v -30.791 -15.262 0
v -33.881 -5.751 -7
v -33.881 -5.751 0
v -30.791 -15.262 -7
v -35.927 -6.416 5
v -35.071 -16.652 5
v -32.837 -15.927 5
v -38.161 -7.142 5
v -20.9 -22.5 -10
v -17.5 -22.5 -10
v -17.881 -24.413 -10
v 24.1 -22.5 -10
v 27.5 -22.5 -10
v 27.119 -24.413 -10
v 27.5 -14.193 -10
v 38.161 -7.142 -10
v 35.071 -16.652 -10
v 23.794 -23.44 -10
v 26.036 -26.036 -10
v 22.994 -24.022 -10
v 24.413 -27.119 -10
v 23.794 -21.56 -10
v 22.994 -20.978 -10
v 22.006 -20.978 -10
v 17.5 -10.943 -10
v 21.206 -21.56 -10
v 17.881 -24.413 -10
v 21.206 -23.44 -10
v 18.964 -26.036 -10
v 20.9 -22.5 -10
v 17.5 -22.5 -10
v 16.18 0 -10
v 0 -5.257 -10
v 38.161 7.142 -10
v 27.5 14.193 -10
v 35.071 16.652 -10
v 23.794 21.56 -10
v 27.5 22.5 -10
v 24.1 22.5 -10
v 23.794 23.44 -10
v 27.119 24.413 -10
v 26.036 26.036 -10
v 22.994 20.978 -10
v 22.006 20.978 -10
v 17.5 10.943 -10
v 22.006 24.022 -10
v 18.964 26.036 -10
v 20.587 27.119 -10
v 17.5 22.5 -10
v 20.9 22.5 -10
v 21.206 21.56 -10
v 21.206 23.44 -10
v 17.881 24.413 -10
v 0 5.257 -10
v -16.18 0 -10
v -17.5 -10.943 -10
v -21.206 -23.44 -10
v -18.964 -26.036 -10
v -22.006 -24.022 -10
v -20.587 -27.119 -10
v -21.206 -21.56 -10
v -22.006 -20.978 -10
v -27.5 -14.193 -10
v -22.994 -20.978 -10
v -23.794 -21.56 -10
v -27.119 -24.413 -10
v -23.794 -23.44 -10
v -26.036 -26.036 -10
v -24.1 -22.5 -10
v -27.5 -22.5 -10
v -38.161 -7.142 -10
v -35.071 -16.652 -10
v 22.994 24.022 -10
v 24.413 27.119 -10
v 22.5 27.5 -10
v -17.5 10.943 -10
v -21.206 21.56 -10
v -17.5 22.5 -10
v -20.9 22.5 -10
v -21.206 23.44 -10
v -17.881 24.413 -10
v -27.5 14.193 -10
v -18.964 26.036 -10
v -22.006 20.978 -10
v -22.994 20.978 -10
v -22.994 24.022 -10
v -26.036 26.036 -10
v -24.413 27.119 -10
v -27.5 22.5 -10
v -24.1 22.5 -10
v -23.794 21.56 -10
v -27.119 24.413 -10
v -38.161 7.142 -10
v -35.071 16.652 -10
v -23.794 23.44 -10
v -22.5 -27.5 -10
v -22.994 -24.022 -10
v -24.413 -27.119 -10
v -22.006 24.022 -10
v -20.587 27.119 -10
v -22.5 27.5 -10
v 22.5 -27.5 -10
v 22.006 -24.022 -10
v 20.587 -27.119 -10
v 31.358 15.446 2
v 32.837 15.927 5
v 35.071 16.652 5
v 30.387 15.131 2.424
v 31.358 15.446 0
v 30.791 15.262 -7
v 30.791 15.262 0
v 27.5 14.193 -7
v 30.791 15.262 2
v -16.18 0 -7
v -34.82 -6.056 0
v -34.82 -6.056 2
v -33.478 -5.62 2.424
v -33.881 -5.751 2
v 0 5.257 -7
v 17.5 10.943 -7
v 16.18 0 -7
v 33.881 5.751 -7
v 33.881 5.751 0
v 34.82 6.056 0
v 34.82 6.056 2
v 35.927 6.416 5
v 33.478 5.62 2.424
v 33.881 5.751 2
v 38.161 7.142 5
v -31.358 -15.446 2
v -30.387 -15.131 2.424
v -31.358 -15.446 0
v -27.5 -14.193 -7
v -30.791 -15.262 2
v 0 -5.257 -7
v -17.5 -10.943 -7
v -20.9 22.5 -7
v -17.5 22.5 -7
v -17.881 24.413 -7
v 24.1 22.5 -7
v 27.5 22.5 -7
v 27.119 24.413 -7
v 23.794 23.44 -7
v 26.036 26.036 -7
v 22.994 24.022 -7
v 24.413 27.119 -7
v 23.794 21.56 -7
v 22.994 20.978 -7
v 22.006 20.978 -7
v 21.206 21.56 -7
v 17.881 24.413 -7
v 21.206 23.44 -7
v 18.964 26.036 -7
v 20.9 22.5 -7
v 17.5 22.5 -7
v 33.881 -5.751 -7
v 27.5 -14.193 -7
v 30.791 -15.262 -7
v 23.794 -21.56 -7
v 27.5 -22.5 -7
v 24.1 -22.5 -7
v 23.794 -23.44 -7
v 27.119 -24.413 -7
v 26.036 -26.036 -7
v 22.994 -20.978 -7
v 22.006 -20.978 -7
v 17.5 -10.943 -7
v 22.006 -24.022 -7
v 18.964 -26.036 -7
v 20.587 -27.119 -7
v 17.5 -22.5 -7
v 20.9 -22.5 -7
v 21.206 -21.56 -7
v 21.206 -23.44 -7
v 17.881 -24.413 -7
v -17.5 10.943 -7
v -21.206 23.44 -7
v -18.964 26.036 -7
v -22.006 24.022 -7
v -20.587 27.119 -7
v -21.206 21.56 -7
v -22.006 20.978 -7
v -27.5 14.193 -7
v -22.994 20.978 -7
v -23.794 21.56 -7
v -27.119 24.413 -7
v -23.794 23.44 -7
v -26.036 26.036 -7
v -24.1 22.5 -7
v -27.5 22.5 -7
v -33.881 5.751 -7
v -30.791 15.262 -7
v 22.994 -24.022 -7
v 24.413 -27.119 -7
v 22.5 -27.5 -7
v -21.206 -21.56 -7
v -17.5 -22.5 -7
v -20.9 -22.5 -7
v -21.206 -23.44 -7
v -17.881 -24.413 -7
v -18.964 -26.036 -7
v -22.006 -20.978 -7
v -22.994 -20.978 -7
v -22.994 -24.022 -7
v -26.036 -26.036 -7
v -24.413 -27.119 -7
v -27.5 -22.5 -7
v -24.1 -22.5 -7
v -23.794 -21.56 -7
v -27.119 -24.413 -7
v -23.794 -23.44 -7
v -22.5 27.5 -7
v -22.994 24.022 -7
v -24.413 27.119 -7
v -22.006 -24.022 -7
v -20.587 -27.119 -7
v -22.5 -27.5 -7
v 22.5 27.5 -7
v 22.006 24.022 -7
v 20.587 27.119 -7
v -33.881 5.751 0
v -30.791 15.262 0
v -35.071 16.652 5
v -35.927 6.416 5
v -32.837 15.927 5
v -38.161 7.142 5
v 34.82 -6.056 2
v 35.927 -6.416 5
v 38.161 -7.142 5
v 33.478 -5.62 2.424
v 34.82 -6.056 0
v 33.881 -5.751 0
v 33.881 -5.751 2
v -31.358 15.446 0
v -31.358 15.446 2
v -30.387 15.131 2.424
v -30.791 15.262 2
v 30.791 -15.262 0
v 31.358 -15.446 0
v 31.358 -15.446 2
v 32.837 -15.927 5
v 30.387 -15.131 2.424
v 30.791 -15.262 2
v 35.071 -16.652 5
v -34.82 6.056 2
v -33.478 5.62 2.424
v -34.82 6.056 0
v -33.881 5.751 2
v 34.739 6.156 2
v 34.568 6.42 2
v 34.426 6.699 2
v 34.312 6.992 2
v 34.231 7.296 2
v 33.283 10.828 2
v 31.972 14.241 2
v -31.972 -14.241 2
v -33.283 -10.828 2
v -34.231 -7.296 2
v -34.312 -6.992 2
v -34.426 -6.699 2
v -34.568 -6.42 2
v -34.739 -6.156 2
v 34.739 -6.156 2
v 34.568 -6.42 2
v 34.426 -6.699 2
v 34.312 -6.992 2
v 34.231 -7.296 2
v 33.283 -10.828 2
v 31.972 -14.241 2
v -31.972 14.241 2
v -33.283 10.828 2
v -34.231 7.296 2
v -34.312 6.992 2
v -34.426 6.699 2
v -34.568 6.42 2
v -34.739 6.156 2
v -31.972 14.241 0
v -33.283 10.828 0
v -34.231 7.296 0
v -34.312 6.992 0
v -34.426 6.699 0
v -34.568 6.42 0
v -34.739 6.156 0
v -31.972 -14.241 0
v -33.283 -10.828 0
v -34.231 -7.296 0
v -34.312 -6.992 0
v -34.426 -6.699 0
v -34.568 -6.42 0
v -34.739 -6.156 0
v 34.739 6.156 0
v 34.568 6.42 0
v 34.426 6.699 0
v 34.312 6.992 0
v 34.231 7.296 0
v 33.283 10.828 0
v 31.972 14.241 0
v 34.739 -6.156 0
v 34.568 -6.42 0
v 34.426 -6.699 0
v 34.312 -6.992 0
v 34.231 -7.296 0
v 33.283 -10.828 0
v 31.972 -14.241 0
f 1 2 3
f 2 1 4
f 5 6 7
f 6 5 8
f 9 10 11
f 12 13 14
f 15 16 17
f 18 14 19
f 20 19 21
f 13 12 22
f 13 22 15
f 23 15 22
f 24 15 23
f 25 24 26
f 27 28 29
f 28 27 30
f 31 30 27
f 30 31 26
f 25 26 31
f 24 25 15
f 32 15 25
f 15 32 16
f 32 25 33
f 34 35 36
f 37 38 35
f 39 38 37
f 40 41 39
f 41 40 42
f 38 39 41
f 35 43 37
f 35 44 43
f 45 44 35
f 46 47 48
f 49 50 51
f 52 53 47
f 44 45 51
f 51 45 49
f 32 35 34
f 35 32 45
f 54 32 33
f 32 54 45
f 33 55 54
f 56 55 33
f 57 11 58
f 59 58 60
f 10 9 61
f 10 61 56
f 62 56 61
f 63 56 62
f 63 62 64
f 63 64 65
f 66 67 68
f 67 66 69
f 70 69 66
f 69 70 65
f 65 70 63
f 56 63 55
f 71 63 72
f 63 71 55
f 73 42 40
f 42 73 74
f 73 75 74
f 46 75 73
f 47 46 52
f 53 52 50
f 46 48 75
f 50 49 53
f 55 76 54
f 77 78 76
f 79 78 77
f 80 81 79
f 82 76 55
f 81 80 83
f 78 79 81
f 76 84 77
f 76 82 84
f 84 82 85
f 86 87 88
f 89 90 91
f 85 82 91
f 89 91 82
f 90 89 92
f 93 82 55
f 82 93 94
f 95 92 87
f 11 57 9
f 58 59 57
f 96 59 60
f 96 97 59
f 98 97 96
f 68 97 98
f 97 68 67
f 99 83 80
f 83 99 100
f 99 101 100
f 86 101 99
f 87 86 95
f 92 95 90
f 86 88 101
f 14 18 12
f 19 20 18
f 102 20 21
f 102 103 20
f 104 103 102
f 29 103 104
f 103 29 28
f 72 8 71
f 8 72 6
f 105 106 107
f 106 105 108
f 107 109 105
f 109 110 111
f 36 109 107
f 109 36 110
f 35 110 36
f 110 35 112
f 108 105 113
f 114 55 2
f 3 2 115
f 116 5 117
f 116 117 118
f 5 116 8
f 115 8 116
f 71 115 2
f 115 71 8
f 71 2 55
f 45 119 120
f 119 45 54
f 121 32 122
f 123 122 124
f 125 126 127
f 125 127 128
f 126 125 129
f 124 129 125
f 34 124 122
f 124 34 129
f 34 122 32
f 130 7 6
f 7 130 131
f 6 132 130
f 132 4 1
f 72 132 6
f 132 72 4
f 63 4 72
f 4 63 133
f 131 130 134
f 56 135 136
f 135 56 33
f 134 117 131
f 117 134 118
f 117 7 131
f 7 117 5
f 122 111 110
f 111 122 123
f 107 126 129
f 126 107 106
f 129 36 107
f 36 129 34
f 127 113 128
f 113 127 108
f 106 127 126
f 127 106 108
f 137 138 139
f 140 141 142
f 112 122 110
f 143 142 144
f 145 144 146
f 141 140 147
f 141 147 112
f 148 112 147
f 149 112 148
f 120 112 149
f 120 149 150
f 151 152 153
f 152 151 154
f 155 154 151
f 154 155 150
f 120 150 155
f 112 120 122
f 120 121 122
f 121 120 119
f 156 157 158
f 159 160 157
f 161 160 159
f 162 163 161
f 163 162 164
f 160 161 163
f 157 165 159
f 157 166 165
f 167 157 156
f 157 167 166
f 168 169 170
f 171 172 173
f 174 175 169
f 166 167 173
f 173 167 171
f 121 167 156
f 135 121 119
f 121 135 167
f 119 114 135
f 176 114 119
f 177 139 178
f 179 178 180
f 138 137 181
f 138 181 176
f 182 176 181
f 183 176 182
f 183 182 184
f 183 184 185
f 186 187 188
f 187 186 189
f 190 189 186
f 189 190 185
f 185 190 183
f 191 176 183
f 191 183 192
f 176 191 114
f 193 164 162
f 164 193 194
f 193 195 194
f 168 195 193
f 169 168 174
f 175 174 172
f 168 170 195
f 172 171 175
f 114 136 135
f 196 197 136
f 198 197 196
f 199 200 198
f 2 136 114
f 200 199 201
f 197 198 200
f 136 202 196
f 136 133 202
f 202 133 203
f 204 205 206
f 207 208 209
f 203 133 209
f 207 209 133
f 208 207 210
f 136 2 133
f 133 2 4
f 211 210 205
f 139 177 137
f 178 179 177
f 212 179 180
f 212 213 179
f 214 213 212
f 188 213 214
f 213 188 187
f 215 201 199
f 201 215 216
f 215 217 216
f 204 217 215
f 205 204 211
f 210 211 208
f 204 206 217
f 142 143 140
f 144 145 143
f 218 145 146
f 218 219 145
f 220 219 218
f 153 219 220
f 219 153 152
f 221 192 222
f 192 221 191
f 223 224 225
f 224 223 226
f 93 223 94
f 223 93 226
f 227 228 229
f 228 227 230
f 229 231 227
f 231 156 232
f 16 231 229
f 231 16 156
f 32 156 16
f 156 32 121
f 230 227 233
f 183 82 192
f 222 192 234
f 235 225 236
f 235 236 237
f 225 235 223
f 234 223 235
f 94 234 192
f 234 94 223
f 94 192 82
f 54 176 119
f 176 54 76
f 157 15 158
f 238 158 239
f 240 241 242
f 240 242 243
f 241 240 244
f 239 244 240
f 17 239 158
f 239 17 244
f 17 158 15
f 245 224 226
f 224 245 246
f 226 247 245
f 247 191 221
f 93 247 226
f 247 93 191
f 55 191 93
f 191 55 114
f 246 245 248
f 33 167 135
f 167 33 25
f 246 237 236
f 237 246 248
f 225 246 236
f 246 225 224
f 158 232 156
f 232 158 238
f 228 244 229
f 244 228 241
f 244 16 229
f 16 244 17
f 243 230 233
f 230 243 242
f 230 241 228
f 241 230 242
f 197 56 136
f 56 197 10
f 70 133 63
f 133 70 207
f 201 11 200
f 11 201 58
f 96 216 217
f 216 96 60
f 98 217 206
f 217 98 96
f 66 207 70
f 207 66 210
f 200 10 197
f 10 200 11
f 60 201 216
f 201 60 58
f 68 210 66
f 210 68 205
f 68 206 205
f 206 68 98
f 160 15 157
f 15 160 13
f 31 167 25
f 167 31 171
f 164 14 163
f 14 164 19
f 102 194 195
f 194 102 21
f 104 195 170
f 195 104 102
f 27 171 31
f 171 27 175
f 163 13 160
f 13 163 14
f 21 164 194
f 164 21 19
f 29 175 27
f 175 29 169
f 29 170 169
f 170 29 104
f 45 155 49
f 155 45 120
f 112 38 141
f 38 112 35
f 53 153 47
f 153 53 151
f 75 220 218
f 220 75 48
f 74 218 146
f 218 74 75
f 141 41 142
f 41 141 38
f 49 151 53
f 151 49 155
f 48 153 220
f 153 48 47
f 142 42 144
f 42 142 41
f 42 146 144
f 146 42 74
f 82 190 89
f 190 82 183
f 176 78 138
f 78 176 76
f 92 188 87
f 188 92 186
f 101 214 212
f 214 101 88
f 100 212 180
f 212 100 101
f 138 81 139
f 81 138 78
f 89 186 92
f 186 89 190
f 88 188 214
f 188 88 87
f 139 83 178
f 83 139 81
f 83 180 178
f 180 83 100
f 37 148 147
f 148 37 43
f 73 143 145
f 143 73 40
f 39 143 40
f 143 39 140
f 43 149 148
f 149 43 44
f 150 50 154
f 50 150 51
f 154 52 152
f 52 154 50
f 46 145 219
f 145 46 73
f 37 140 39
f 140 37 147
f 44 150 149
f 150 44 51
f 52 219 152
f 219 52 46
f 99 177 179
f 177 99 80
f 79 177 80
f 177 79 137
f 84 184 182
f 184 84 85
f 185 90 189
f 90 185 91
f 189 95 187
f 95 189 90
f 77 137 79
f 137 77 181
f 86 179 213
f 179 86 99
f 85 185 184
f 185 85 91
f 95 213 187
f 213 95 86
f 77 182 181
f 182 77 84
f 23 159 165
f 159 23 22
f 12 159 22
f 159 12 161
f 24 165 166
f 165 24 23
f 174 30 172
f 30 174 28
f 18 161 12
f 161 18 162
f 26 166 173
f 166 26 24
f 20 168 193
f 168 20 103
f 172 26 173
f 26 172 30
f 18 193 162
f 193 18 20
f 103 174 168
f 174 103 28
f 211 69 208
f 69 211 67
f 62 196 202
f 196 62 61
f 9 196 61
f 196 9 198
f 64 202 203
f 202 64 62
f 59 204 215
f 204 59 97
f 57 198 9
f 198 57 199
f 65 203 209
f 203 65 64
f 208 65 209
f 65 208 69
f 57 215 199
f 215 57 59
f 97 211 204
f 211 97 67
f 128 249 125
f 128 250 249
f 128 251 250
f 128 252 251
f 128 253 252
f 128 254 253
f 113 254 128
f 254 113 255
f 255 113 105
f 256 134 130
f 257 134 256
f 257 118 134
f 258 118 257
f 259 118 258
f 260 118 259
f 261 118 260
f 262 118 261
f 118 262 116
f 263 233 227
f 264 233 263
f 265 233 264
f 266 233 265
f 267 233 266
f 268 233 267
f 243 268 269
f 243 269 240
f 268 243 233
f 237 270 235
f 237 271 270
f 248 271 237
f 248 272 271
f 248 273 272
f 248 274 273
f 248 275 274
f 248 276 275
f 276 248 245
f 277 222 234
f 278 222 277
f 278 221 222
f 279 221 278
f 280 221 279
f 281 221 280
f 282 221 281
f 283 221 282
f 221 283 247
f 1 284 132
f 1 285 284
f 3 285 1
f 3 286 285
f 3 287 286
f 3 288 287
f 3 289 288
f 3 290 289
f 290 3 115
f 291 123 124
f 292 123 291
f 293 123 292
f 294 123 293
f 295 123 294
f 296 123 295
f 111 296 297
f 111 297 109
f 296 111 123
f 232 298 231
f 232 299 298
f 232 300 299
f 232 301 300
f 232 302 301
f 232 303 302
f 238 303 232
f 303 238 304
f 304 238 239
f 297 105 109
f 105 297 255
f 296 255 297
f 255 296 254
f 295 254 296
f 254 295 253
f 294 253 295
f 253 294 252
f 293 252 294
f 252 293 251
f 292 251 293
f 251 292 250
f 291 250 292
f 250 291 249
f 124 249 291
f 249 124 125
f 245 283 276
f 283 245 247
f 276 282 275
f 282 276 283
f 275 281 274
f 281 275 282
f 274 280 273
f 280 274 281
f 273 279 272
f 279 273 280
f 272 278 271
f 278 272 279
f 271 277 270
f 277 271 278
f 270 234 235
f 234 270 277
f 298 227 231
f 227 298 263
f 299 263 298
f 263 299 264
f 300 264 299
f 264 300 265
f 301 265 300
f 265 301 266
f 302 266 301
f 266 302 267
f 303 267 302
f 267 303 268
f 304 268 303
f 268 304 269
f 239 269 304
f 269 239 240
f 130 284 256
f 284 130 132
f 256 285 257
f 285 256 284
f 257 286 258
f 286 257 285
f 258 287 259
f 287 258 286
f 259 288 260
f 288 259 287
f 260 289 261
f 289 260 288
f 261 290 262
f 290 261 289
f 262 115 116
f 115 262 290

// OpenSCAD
module holes(){
	linear_extrude(height=2)
		import("bottom-plate.dxf", $fn=60);
}

module base_plate(){
	difference(){
		cylinder(r=70, h=2);
		holes();
	}
}

module gewindeloch(){
	cylinder(r=1.6, h=6, $fn=10);
}

module gimbal_holes(){
	translate([22.5,22.5,0])
		gewindeloch();
	translate([-22.5,22.5,0])
		gewindeloch();
	translate([22.5,-22.5,0])
		gewindeloch();
	translate([-22.5,-22.5,0])
		gewindeloch();
}
module nose(){
	difference(){
		union(){
			cube([4.5,10,15]);
			translate([4.5,0,12.0])
				rotate([0,-45,0]){
					cube([1,10,4]);
				}
		}
		translate([4.5,0,12.0])
			rotate([0,-45,0]){
				translate([0.6,0,0])
					cube([3,10,10]);
			}
		translate([0,0,15])
		cube([4.5,10,3]);
	}
}

module buegel(){
		translate([0,0,1.5])
			cube([77,10,3], center=true);
		translate([-77/2,-5,0]){
			nose();
		}
		rotate([0,0,180])
			translate([-77/2,-5,0]){
				nose();
			}
}
module quarter_holder(){
	translate([0,5,0])
		cube([10,17,3]);
	translate([5,5,0]){
		cylinder(r=5,h=3);
	}
}
module half_holder(){
	translate([-27.5,-27.5,0]){
		quarter_holder();
	}
	translate([45-27.5,-27.5,0]){
		quarter_holder();
	}
}
module all(){
	difference(){
		translate([0,0,-10]){	
			difference(){
				union(){
					rotate([0,0,18]){
						buegel();
					}
					rotate([0,0,-18]){
						buegel();
					}
					half_holder();
					rotate([0,0,180])
						half_holder();
				}
				gimbal_holes();
			}
		}
		base_plate();
	}
}
all();
//base_plate();
//nose();
//quarter_holder();
